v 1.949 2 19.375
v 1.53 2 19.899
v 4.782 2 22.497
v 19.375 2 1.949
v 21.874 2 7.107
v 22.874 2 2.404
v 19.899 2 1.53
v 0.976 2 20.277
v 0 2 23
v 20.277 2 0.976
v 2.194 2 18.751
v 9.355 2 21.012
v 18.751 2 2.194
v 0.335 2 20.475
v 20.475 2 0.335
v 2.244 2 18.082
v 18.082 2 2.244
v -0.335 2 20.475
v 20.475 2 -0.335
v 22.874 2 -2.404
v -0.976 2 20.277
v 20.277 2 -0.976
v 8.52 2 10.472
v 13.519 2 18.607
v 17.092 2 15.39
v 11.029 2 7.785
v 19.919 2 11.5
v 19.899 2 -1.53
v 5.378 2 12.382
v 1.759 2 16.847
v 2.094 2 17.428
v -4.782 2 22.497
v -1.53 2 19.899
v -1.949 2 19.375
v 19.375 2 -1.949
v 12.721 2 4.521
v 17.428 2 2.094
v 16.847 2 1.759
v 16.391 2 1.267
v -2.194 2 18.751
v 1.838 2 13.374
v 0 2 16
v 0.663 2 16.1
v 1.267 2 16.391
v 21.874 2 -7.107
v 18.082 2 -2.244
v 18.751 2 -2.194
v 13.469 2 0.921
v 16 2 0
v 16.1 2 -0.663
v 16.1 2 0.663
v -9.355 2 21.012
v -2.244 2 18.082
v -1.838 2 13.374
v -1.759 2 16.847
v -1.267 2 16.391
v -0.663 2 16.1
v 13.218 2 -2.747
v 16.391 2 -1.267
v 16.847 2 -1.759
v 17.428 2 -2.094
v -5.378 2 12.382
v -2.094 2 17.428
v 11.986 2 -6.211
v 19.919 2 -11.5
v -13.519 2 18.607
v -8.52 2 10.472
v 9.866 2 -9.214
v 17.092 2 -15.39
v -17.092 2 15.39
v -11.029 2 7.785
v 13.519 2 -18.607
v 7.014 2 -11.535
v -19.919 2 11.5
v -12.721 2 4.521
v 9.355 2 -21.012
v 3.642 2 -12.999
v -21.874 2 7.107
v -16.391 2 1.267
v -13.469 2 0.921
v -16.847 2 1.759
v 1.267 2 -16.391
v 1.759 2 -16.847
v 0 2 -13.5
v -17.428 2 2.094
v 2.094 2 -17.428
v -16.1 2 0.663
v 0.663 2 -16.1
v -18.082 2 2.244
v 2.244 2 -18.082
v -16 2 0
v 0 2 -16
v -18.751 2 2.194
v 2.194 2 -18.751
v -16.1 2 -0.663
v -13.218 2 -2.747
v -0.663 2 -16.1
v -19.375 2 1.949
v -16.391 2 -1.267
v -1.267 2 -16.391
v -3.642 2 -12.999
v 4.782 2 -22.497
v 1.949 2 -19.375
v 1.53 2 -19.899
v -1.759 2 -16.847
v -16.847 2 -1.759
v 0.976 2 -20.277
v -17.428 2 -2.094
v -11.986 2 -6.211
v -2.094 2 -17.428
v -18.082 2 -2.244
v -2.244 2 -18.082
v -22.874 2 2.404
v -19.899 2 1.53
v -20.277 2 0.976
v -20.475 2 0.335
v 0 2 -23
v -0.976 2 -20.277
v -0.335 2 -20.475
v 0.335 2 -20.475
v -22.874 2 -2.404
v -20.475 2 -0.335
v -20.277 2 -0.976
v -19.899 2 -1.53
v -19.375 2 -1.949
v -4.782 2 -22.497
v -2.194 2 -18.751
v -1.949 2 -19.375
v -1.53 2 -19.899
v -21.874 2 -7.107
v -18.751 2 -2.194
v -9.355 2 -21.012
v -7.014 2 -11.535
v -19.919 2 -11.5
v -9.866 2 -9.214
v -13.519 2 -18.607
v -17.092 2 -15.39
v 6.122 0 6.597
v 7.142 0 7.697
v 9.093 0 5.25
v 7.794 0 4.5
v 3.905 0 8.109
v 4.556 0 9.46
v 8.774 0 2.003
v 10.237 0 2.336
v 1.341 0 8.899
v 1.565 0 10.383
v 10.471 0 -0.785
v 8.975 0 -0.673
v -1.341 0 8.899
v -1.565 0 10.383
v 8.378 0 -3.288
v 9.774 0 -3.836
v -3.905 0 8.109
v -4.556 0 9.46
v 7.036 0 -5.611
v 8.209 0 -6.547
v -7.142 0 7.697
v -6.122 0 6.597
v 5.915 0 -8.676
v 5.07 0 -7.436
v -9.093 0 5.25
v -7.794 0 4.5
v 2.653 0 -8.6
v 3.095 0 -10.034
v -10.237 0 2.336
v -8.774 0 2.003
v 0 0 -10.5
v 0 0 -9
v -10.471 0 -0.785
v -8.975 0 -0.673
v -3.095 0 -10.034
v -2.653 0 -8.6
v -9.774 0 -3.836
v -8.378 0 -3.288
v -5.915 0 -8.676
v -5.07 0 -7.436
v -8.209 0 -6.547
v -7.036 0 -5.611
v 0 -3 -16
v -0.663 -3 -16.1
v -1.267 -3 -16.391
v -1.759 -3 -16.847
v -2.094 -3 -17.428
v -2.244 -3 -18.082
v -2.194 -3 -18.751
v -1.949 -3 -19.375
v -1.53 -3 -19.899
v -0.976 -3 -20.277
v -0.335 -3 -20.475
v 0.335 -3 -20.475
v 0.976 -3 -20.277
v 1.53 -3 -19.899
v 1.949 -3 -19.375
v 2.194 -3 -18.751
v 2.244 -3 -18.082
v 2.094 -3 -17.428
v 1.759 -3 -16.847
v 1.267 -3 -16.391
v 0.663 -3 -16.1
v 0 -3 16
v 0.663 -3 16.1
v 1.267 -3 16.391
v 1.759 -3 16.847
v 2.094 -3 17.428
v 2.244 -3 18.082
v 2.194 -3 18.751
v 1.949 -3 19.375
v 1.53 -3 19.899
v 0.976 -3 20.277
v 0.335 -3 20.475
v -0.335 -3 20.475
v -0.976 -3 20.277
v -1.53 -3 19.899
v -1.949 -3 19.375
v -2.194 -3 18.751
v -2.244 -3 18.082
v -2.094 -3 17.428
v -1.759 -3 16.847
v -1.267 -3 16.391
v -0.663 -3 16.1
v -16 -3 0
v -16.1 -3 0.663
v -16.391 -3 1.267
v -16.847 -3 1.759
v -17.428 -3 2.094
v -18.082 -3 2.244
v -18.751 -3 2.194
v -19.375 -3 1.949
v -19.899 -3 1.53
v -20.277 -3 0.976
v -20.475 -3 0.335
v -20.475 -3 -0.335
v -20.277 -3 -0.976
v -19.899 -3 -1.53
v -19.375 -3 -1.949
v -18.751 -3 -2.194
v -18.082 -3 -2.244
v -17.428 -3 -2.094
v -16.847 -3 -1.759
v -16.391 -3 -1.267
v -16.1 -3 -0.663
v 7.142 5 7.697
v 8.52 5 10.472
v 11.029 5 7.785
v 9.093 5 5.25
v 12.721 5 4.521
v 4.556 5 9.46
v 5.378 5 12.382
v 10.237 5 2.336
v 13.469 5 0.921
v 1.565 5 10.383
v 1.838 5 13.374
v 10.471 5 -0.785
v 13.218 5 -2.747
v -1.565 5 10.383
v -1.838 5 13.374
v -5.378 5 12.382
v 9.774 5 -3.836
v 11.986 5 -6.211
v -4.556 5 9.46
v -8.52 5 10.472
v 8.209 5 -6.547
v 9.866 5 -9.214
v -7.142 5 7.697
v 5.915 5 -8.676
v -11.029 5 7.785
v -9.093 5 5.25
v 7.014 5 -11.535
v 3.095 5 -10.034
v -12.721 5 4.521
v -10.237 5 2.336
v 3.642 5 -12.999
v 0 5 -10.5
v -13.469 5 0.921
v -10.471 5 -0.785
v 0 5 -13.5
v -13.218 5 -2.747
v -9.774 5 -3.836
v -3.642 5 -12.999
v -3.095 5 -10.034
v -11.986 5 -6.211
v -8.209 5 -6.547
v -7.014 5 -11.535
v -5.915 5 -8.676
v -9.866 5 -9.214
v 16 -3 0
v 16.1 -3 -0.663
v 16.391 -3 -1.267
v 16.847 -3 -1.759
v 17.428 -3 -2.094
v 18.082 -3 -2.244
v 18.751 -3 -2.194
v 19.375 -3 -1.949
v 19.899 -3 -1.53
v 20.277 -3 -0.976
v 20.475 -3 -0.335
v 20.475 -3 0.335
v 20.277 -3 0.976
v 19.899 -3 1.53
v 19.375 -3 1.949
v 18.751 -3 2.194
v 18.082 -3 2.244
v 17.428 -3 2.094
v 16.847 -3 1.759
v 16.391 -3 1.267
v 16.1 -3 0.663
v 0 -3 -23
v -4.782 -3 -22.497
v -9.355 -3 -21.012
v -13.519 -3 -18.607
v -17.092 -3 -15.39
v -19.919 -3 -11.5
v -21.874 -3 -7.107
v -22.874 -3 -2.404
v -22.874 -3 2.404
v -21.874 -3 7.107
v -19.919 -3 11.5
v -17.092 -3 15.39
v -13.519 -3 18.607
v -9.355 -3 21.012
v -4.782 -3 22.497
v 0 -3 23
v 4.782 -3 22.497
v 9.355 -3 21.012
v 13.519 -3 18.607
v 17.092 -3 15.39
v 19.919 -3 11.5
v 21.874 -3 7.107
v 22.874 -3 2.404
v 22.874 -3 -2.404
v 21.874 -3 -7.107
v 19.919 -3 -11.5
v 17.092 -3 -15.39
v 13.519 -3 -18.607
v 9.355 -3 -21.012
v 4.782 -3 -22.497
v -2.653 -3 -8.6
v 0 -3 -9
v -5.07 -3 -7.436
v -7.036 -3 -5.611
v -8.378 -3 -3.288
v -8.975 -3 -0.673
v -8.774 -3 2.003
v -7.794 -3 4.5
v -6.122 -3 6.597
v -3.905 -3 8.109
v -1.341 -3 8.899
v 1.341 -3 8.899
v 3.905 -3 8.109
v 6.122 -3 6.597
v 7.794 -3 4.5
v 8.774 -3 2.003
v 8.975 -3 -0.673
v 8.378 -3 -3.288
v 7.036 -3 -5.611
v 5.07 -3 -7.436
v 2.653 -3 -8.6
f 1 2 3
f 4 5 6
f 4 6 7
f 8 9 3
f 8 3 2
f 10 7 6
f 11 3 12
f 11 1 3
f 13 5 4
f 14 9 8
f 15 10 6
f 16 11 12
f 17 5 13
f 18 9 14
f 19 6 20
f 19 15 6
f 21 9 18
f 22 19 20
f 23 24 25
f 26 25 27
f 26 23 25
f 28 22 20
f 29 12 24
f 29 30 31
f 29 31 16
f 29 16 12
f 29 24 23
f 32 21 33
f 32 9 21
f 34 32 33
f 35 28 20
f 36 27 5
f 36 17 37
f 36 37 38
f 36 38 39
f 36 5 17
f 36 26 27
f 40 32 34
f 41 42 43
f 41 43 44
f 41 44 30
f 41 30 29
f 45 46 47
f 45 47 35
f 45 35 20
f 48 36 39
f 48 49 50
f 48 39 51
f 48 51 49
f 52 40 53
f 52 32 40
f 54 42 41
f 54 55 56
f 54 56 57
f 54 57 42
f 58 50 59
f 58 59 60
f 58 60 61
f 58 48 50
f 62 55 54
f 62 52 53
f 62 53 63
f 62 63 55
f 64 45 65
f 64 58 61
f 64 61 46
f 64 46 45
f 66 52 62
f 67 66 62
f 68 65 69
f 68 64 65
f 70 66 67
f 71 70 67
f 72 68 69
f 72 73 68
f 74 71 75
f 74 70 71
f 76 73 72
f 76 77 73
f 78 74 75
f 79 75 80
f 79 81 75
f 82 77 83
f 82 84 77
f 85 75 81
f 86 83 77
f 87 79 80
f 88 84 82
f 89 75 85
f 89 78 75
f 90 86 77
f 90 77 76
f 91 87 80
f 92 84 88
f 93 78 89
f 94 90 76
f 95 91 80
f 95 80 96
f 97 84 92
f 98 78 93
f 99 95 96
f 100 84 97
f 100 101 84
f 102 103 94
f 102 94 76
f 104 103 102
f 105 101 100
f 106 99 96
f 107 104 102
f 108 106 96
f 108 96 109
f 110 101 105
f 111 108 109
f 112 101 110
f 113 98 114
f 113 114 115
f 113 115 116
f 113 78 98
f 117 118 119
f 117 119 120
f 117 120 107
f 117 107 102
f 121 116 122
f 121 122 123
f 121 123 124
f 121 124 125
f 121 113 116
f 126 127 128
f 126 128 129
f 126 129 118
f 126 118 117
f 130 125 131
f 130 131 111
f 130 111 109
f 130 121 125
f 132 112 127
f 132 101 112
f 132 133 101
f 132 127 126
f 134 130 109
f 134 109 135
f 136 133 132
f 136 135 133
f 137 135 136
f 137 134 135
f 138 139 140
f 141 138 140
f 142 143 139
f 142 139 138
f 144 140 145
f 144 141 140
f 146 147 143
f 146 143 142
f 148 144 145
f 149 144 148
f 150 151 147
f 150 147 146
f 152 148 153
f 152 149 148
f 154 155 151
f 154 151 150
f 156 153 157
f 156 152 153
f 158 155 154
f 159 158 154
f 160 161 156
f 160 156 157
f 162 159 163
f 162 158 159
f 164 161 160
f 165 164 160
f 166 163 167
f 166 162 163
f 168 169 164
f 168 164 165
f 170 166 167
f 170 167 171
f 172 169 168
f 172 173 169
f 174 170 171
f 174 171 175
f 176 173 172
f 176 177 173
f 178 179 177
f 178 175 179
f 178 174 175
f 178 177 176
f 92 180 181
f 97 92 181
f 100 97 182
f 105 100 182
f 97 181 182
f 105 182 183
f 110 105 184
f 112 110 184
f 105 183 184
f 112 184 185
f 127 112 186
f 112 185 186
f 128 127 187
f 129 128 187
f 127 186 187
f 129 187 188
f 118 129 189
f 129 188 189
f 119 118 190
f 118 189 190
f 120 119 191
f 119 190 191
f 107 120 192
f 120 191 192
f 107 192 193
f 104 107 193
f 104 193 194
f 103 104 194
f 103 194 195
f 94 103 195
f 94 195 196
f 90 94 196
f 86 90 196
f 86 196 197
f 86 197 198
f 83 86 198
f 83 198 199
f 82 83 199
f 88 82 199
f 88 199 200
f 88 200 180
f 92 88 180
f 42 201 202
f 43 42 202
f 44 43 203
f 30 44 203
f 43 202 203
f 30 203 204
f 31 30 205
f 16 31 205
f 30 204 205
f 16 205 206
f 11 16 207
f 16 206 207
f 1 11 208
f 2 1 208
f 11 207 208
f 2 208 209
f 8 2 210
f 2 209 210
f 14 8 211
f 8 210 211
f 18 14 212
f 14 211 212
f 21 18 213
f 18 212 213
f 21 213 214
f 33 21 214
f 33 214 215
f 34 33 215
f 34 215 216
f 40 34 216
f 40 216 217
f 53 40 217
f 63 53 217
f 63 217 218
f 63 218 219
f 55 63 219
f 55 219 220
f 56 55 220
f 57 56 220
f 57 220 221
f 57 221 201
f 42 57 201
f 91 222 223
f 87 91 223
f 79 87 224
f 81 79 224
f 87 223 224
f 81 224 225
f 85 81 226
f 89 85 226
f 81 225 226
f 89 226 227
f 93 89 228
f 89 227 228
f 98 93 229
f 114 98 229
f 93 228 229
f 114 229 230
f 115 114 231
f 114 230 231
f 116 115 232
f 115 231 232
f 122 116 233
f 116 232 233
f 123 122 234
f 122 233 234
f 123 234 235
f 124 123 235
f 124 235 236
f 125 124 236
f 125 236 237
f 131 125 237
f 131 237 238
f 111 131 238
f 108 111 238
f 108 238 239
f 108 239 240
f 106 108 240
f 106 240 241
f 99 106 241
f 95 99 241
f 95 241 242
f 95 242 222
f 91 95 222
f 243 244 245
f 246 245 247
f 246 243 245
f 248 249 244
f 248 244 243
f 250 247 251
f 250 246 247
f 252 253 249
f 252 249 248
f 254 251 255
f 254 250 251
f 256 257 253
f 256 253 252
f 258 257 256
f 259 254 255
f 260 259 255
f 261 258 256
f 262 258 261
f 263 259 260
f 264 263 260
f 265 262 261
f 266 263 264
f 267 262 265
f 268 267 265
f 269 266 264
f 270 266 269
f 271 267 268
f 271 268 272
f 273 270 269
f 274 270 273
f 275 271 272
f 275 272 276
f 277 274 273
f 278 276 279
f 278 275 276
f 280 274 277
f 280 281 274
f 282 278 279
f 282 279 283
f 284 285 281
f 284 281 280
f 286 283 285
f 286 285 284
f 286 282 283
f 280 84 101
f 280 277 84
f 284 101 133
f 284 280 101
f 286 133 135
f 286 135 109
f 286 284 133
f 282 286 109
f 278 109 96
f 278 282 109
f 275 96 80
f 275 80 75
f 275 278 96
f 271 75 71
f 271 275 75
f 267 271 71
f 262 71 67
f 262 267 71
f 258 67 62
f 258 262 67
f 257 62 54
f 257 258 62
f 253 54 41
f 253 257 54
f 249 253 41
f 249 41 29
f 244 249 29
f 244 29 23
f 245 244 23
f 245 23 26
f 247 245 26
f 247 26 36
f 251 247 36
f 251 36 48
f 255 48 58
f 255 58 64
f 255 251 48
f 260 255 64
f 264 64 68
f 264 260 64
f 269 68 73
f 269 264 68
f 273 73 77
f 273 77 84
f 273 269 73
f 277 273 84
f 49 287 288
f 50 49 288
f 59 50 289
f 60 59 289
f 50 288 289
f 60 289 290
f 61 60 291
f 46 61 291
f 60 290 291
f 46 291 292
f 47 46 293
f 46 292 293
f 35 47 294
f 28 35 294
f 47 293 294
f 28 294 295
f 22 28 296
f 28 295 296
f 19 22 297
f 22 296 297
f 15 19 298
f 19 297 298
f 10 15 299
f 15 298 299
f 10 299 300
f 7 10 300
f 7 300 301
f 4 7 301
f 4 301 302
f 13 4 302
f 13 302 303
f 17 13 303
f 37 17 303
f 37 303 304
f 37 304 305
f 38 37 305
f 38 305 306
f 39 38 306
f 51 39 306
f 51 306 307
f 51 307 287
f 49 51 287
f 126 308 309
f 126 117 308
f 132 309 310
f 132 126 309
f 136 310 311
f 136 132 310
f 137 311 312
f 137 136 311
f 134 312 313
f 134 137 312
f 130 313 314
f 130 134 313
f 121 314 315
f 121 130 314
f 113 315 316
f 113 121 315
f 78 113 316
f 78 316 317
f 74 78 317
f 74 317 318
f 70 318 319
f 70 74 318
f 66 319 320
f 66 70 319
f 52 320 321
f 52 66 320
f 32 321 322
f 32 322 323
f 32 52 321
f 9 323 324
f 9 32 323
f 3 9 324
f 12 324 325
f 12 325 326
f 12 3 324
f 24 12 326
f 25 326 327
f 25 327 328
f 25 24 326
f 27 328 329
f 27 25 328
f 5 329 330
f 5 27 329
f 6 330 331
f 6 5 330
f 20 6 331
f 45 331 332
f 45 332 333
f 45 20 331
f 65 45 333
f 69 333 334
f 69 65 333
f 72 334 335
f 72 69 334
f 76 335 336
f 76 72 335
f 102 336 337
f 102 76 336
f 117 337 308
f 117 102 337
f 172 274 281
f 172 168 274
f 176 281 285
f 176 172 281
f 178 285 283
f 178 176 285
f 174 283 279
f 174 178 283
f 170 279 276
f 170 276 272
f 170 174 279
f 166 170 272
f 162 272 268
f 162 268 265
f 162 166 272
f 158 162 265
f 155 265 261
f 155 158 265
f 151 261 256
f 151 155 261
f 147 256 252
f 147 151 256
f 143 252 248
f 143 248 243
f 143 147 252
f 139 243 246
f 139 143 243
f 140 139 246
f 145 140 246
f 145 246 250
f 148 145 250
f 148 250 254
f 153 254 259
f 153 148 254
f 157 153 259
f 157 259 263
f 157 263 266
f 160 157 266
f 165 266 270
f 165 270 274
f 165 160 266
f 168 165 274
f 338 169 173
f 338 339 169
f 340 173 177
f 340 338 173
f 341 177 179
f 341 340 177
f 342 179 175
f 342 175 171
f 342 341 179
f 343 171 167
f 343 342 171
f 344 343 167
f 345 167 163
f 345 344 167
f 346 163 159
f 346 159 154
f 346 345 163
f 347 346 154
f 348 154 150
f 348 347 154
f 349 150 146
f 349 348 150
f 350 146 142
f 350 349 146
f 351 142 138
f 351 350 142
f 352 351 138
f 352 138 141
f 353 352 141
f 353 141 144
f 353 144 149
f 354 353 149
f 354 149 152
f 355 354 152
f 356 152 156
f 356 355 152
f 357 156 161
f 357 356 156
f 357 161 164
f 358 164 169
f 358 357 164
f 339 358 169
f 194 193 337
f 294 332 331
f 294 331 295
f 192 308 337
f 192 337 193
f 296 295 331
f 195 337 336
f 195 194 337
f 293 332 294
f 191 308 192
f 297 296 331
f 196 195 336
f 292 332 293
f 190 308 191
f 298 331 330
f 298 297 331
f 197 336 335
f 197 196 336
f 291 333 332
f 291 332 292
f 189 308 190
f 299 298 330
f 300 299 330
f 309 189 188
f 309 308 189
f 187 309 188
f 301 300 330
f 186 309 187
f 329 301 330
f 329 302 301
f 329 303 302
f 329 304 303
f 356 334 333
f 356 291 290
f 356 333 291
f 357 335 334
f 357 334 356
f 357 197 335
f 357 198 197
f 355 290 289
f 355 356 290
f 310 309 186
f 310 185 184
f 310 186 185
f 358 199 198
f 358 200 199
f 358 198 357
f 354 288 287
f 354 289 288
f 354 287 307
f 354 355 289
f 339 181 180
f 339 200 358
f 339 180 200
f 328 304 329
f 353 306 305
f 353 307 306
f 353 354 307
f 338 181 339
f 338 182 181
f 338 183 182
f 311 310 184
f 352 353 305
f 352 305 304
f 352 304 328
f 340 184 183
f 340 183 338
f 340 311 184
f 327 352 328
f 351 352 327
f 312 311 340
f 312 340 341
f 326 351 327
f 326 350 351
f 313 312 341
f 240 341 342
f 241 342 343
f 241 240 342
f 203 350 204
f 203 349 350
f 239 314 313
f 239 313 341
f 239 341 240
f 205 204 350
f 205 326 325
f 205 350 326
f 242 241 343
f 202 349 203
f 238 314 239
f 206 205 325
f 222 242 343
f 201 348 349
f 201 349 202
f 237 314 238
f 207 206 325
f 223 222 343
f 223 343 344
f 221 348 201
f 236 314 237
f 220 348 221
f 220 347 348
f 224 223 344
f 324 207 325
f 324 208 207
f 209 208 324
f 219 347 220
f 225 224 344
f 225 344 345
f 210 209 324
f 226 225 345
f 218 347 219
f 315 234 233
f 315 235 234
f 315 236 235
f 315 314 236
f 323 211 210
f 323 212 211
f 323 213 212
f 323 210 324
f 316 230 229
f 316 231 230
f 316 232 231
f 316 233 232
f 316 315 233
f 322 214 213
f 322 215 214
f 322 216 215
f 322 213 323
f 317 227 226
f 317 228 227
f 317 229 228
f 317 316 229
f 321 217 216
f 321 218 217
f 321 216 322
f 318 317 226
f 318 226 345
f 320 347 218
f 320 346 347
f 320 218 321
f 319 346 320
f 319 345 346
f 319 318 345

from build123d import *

# Parameters (mm, degrees)
M4_CLEARANCE_HOLE1_D = 4.5
CIRPATTERN1_COUNT    = 4


with BuildPart() as part:
    # Sketch1 → Revolve1 (revolve)
    with BuildSketch(Plane.XY, mode=Mode.PRIVATE) as revolve1_sk:
        Polygon((9, 0), (9, -3), (23, -3), (23, 2), (13.5, 2), (13.5, 5), (10.5, 5), (10.5, 0), align=None)
    revolve(revolve1_sk.sketch.rotate(Axis((0, -55, 0), (0, 1, 0)), 90), axis=Axis((0, -55, 0), (0, 1, 0)))

    # M4 Clearance Hole1 (through all)
    with Locations(Plane(origin=(0, 2, 0), x_dir=(1, 0, 0), z_dir=(0, 1, 0))):
        with Locations((18.25, 0)):
            m4_clearance_hole1 = Hole(M4_CLEARANCE_HOLE1_D / 2)

    # CirPattern1: M4 Clearance Hole1 ×4 about axis
    cirpattern1_axis = Axis((0, 0, 0), (0, 1, 0))
    for i in range(1, CIRPATTERN1_COUNT):
        add(m4_clearance_hole1.rotate(cirpattern1_axis, i * 360 / CIRPATTERN1_COUNT), mode=Mode.SUBTRACT)


solid = part.part
